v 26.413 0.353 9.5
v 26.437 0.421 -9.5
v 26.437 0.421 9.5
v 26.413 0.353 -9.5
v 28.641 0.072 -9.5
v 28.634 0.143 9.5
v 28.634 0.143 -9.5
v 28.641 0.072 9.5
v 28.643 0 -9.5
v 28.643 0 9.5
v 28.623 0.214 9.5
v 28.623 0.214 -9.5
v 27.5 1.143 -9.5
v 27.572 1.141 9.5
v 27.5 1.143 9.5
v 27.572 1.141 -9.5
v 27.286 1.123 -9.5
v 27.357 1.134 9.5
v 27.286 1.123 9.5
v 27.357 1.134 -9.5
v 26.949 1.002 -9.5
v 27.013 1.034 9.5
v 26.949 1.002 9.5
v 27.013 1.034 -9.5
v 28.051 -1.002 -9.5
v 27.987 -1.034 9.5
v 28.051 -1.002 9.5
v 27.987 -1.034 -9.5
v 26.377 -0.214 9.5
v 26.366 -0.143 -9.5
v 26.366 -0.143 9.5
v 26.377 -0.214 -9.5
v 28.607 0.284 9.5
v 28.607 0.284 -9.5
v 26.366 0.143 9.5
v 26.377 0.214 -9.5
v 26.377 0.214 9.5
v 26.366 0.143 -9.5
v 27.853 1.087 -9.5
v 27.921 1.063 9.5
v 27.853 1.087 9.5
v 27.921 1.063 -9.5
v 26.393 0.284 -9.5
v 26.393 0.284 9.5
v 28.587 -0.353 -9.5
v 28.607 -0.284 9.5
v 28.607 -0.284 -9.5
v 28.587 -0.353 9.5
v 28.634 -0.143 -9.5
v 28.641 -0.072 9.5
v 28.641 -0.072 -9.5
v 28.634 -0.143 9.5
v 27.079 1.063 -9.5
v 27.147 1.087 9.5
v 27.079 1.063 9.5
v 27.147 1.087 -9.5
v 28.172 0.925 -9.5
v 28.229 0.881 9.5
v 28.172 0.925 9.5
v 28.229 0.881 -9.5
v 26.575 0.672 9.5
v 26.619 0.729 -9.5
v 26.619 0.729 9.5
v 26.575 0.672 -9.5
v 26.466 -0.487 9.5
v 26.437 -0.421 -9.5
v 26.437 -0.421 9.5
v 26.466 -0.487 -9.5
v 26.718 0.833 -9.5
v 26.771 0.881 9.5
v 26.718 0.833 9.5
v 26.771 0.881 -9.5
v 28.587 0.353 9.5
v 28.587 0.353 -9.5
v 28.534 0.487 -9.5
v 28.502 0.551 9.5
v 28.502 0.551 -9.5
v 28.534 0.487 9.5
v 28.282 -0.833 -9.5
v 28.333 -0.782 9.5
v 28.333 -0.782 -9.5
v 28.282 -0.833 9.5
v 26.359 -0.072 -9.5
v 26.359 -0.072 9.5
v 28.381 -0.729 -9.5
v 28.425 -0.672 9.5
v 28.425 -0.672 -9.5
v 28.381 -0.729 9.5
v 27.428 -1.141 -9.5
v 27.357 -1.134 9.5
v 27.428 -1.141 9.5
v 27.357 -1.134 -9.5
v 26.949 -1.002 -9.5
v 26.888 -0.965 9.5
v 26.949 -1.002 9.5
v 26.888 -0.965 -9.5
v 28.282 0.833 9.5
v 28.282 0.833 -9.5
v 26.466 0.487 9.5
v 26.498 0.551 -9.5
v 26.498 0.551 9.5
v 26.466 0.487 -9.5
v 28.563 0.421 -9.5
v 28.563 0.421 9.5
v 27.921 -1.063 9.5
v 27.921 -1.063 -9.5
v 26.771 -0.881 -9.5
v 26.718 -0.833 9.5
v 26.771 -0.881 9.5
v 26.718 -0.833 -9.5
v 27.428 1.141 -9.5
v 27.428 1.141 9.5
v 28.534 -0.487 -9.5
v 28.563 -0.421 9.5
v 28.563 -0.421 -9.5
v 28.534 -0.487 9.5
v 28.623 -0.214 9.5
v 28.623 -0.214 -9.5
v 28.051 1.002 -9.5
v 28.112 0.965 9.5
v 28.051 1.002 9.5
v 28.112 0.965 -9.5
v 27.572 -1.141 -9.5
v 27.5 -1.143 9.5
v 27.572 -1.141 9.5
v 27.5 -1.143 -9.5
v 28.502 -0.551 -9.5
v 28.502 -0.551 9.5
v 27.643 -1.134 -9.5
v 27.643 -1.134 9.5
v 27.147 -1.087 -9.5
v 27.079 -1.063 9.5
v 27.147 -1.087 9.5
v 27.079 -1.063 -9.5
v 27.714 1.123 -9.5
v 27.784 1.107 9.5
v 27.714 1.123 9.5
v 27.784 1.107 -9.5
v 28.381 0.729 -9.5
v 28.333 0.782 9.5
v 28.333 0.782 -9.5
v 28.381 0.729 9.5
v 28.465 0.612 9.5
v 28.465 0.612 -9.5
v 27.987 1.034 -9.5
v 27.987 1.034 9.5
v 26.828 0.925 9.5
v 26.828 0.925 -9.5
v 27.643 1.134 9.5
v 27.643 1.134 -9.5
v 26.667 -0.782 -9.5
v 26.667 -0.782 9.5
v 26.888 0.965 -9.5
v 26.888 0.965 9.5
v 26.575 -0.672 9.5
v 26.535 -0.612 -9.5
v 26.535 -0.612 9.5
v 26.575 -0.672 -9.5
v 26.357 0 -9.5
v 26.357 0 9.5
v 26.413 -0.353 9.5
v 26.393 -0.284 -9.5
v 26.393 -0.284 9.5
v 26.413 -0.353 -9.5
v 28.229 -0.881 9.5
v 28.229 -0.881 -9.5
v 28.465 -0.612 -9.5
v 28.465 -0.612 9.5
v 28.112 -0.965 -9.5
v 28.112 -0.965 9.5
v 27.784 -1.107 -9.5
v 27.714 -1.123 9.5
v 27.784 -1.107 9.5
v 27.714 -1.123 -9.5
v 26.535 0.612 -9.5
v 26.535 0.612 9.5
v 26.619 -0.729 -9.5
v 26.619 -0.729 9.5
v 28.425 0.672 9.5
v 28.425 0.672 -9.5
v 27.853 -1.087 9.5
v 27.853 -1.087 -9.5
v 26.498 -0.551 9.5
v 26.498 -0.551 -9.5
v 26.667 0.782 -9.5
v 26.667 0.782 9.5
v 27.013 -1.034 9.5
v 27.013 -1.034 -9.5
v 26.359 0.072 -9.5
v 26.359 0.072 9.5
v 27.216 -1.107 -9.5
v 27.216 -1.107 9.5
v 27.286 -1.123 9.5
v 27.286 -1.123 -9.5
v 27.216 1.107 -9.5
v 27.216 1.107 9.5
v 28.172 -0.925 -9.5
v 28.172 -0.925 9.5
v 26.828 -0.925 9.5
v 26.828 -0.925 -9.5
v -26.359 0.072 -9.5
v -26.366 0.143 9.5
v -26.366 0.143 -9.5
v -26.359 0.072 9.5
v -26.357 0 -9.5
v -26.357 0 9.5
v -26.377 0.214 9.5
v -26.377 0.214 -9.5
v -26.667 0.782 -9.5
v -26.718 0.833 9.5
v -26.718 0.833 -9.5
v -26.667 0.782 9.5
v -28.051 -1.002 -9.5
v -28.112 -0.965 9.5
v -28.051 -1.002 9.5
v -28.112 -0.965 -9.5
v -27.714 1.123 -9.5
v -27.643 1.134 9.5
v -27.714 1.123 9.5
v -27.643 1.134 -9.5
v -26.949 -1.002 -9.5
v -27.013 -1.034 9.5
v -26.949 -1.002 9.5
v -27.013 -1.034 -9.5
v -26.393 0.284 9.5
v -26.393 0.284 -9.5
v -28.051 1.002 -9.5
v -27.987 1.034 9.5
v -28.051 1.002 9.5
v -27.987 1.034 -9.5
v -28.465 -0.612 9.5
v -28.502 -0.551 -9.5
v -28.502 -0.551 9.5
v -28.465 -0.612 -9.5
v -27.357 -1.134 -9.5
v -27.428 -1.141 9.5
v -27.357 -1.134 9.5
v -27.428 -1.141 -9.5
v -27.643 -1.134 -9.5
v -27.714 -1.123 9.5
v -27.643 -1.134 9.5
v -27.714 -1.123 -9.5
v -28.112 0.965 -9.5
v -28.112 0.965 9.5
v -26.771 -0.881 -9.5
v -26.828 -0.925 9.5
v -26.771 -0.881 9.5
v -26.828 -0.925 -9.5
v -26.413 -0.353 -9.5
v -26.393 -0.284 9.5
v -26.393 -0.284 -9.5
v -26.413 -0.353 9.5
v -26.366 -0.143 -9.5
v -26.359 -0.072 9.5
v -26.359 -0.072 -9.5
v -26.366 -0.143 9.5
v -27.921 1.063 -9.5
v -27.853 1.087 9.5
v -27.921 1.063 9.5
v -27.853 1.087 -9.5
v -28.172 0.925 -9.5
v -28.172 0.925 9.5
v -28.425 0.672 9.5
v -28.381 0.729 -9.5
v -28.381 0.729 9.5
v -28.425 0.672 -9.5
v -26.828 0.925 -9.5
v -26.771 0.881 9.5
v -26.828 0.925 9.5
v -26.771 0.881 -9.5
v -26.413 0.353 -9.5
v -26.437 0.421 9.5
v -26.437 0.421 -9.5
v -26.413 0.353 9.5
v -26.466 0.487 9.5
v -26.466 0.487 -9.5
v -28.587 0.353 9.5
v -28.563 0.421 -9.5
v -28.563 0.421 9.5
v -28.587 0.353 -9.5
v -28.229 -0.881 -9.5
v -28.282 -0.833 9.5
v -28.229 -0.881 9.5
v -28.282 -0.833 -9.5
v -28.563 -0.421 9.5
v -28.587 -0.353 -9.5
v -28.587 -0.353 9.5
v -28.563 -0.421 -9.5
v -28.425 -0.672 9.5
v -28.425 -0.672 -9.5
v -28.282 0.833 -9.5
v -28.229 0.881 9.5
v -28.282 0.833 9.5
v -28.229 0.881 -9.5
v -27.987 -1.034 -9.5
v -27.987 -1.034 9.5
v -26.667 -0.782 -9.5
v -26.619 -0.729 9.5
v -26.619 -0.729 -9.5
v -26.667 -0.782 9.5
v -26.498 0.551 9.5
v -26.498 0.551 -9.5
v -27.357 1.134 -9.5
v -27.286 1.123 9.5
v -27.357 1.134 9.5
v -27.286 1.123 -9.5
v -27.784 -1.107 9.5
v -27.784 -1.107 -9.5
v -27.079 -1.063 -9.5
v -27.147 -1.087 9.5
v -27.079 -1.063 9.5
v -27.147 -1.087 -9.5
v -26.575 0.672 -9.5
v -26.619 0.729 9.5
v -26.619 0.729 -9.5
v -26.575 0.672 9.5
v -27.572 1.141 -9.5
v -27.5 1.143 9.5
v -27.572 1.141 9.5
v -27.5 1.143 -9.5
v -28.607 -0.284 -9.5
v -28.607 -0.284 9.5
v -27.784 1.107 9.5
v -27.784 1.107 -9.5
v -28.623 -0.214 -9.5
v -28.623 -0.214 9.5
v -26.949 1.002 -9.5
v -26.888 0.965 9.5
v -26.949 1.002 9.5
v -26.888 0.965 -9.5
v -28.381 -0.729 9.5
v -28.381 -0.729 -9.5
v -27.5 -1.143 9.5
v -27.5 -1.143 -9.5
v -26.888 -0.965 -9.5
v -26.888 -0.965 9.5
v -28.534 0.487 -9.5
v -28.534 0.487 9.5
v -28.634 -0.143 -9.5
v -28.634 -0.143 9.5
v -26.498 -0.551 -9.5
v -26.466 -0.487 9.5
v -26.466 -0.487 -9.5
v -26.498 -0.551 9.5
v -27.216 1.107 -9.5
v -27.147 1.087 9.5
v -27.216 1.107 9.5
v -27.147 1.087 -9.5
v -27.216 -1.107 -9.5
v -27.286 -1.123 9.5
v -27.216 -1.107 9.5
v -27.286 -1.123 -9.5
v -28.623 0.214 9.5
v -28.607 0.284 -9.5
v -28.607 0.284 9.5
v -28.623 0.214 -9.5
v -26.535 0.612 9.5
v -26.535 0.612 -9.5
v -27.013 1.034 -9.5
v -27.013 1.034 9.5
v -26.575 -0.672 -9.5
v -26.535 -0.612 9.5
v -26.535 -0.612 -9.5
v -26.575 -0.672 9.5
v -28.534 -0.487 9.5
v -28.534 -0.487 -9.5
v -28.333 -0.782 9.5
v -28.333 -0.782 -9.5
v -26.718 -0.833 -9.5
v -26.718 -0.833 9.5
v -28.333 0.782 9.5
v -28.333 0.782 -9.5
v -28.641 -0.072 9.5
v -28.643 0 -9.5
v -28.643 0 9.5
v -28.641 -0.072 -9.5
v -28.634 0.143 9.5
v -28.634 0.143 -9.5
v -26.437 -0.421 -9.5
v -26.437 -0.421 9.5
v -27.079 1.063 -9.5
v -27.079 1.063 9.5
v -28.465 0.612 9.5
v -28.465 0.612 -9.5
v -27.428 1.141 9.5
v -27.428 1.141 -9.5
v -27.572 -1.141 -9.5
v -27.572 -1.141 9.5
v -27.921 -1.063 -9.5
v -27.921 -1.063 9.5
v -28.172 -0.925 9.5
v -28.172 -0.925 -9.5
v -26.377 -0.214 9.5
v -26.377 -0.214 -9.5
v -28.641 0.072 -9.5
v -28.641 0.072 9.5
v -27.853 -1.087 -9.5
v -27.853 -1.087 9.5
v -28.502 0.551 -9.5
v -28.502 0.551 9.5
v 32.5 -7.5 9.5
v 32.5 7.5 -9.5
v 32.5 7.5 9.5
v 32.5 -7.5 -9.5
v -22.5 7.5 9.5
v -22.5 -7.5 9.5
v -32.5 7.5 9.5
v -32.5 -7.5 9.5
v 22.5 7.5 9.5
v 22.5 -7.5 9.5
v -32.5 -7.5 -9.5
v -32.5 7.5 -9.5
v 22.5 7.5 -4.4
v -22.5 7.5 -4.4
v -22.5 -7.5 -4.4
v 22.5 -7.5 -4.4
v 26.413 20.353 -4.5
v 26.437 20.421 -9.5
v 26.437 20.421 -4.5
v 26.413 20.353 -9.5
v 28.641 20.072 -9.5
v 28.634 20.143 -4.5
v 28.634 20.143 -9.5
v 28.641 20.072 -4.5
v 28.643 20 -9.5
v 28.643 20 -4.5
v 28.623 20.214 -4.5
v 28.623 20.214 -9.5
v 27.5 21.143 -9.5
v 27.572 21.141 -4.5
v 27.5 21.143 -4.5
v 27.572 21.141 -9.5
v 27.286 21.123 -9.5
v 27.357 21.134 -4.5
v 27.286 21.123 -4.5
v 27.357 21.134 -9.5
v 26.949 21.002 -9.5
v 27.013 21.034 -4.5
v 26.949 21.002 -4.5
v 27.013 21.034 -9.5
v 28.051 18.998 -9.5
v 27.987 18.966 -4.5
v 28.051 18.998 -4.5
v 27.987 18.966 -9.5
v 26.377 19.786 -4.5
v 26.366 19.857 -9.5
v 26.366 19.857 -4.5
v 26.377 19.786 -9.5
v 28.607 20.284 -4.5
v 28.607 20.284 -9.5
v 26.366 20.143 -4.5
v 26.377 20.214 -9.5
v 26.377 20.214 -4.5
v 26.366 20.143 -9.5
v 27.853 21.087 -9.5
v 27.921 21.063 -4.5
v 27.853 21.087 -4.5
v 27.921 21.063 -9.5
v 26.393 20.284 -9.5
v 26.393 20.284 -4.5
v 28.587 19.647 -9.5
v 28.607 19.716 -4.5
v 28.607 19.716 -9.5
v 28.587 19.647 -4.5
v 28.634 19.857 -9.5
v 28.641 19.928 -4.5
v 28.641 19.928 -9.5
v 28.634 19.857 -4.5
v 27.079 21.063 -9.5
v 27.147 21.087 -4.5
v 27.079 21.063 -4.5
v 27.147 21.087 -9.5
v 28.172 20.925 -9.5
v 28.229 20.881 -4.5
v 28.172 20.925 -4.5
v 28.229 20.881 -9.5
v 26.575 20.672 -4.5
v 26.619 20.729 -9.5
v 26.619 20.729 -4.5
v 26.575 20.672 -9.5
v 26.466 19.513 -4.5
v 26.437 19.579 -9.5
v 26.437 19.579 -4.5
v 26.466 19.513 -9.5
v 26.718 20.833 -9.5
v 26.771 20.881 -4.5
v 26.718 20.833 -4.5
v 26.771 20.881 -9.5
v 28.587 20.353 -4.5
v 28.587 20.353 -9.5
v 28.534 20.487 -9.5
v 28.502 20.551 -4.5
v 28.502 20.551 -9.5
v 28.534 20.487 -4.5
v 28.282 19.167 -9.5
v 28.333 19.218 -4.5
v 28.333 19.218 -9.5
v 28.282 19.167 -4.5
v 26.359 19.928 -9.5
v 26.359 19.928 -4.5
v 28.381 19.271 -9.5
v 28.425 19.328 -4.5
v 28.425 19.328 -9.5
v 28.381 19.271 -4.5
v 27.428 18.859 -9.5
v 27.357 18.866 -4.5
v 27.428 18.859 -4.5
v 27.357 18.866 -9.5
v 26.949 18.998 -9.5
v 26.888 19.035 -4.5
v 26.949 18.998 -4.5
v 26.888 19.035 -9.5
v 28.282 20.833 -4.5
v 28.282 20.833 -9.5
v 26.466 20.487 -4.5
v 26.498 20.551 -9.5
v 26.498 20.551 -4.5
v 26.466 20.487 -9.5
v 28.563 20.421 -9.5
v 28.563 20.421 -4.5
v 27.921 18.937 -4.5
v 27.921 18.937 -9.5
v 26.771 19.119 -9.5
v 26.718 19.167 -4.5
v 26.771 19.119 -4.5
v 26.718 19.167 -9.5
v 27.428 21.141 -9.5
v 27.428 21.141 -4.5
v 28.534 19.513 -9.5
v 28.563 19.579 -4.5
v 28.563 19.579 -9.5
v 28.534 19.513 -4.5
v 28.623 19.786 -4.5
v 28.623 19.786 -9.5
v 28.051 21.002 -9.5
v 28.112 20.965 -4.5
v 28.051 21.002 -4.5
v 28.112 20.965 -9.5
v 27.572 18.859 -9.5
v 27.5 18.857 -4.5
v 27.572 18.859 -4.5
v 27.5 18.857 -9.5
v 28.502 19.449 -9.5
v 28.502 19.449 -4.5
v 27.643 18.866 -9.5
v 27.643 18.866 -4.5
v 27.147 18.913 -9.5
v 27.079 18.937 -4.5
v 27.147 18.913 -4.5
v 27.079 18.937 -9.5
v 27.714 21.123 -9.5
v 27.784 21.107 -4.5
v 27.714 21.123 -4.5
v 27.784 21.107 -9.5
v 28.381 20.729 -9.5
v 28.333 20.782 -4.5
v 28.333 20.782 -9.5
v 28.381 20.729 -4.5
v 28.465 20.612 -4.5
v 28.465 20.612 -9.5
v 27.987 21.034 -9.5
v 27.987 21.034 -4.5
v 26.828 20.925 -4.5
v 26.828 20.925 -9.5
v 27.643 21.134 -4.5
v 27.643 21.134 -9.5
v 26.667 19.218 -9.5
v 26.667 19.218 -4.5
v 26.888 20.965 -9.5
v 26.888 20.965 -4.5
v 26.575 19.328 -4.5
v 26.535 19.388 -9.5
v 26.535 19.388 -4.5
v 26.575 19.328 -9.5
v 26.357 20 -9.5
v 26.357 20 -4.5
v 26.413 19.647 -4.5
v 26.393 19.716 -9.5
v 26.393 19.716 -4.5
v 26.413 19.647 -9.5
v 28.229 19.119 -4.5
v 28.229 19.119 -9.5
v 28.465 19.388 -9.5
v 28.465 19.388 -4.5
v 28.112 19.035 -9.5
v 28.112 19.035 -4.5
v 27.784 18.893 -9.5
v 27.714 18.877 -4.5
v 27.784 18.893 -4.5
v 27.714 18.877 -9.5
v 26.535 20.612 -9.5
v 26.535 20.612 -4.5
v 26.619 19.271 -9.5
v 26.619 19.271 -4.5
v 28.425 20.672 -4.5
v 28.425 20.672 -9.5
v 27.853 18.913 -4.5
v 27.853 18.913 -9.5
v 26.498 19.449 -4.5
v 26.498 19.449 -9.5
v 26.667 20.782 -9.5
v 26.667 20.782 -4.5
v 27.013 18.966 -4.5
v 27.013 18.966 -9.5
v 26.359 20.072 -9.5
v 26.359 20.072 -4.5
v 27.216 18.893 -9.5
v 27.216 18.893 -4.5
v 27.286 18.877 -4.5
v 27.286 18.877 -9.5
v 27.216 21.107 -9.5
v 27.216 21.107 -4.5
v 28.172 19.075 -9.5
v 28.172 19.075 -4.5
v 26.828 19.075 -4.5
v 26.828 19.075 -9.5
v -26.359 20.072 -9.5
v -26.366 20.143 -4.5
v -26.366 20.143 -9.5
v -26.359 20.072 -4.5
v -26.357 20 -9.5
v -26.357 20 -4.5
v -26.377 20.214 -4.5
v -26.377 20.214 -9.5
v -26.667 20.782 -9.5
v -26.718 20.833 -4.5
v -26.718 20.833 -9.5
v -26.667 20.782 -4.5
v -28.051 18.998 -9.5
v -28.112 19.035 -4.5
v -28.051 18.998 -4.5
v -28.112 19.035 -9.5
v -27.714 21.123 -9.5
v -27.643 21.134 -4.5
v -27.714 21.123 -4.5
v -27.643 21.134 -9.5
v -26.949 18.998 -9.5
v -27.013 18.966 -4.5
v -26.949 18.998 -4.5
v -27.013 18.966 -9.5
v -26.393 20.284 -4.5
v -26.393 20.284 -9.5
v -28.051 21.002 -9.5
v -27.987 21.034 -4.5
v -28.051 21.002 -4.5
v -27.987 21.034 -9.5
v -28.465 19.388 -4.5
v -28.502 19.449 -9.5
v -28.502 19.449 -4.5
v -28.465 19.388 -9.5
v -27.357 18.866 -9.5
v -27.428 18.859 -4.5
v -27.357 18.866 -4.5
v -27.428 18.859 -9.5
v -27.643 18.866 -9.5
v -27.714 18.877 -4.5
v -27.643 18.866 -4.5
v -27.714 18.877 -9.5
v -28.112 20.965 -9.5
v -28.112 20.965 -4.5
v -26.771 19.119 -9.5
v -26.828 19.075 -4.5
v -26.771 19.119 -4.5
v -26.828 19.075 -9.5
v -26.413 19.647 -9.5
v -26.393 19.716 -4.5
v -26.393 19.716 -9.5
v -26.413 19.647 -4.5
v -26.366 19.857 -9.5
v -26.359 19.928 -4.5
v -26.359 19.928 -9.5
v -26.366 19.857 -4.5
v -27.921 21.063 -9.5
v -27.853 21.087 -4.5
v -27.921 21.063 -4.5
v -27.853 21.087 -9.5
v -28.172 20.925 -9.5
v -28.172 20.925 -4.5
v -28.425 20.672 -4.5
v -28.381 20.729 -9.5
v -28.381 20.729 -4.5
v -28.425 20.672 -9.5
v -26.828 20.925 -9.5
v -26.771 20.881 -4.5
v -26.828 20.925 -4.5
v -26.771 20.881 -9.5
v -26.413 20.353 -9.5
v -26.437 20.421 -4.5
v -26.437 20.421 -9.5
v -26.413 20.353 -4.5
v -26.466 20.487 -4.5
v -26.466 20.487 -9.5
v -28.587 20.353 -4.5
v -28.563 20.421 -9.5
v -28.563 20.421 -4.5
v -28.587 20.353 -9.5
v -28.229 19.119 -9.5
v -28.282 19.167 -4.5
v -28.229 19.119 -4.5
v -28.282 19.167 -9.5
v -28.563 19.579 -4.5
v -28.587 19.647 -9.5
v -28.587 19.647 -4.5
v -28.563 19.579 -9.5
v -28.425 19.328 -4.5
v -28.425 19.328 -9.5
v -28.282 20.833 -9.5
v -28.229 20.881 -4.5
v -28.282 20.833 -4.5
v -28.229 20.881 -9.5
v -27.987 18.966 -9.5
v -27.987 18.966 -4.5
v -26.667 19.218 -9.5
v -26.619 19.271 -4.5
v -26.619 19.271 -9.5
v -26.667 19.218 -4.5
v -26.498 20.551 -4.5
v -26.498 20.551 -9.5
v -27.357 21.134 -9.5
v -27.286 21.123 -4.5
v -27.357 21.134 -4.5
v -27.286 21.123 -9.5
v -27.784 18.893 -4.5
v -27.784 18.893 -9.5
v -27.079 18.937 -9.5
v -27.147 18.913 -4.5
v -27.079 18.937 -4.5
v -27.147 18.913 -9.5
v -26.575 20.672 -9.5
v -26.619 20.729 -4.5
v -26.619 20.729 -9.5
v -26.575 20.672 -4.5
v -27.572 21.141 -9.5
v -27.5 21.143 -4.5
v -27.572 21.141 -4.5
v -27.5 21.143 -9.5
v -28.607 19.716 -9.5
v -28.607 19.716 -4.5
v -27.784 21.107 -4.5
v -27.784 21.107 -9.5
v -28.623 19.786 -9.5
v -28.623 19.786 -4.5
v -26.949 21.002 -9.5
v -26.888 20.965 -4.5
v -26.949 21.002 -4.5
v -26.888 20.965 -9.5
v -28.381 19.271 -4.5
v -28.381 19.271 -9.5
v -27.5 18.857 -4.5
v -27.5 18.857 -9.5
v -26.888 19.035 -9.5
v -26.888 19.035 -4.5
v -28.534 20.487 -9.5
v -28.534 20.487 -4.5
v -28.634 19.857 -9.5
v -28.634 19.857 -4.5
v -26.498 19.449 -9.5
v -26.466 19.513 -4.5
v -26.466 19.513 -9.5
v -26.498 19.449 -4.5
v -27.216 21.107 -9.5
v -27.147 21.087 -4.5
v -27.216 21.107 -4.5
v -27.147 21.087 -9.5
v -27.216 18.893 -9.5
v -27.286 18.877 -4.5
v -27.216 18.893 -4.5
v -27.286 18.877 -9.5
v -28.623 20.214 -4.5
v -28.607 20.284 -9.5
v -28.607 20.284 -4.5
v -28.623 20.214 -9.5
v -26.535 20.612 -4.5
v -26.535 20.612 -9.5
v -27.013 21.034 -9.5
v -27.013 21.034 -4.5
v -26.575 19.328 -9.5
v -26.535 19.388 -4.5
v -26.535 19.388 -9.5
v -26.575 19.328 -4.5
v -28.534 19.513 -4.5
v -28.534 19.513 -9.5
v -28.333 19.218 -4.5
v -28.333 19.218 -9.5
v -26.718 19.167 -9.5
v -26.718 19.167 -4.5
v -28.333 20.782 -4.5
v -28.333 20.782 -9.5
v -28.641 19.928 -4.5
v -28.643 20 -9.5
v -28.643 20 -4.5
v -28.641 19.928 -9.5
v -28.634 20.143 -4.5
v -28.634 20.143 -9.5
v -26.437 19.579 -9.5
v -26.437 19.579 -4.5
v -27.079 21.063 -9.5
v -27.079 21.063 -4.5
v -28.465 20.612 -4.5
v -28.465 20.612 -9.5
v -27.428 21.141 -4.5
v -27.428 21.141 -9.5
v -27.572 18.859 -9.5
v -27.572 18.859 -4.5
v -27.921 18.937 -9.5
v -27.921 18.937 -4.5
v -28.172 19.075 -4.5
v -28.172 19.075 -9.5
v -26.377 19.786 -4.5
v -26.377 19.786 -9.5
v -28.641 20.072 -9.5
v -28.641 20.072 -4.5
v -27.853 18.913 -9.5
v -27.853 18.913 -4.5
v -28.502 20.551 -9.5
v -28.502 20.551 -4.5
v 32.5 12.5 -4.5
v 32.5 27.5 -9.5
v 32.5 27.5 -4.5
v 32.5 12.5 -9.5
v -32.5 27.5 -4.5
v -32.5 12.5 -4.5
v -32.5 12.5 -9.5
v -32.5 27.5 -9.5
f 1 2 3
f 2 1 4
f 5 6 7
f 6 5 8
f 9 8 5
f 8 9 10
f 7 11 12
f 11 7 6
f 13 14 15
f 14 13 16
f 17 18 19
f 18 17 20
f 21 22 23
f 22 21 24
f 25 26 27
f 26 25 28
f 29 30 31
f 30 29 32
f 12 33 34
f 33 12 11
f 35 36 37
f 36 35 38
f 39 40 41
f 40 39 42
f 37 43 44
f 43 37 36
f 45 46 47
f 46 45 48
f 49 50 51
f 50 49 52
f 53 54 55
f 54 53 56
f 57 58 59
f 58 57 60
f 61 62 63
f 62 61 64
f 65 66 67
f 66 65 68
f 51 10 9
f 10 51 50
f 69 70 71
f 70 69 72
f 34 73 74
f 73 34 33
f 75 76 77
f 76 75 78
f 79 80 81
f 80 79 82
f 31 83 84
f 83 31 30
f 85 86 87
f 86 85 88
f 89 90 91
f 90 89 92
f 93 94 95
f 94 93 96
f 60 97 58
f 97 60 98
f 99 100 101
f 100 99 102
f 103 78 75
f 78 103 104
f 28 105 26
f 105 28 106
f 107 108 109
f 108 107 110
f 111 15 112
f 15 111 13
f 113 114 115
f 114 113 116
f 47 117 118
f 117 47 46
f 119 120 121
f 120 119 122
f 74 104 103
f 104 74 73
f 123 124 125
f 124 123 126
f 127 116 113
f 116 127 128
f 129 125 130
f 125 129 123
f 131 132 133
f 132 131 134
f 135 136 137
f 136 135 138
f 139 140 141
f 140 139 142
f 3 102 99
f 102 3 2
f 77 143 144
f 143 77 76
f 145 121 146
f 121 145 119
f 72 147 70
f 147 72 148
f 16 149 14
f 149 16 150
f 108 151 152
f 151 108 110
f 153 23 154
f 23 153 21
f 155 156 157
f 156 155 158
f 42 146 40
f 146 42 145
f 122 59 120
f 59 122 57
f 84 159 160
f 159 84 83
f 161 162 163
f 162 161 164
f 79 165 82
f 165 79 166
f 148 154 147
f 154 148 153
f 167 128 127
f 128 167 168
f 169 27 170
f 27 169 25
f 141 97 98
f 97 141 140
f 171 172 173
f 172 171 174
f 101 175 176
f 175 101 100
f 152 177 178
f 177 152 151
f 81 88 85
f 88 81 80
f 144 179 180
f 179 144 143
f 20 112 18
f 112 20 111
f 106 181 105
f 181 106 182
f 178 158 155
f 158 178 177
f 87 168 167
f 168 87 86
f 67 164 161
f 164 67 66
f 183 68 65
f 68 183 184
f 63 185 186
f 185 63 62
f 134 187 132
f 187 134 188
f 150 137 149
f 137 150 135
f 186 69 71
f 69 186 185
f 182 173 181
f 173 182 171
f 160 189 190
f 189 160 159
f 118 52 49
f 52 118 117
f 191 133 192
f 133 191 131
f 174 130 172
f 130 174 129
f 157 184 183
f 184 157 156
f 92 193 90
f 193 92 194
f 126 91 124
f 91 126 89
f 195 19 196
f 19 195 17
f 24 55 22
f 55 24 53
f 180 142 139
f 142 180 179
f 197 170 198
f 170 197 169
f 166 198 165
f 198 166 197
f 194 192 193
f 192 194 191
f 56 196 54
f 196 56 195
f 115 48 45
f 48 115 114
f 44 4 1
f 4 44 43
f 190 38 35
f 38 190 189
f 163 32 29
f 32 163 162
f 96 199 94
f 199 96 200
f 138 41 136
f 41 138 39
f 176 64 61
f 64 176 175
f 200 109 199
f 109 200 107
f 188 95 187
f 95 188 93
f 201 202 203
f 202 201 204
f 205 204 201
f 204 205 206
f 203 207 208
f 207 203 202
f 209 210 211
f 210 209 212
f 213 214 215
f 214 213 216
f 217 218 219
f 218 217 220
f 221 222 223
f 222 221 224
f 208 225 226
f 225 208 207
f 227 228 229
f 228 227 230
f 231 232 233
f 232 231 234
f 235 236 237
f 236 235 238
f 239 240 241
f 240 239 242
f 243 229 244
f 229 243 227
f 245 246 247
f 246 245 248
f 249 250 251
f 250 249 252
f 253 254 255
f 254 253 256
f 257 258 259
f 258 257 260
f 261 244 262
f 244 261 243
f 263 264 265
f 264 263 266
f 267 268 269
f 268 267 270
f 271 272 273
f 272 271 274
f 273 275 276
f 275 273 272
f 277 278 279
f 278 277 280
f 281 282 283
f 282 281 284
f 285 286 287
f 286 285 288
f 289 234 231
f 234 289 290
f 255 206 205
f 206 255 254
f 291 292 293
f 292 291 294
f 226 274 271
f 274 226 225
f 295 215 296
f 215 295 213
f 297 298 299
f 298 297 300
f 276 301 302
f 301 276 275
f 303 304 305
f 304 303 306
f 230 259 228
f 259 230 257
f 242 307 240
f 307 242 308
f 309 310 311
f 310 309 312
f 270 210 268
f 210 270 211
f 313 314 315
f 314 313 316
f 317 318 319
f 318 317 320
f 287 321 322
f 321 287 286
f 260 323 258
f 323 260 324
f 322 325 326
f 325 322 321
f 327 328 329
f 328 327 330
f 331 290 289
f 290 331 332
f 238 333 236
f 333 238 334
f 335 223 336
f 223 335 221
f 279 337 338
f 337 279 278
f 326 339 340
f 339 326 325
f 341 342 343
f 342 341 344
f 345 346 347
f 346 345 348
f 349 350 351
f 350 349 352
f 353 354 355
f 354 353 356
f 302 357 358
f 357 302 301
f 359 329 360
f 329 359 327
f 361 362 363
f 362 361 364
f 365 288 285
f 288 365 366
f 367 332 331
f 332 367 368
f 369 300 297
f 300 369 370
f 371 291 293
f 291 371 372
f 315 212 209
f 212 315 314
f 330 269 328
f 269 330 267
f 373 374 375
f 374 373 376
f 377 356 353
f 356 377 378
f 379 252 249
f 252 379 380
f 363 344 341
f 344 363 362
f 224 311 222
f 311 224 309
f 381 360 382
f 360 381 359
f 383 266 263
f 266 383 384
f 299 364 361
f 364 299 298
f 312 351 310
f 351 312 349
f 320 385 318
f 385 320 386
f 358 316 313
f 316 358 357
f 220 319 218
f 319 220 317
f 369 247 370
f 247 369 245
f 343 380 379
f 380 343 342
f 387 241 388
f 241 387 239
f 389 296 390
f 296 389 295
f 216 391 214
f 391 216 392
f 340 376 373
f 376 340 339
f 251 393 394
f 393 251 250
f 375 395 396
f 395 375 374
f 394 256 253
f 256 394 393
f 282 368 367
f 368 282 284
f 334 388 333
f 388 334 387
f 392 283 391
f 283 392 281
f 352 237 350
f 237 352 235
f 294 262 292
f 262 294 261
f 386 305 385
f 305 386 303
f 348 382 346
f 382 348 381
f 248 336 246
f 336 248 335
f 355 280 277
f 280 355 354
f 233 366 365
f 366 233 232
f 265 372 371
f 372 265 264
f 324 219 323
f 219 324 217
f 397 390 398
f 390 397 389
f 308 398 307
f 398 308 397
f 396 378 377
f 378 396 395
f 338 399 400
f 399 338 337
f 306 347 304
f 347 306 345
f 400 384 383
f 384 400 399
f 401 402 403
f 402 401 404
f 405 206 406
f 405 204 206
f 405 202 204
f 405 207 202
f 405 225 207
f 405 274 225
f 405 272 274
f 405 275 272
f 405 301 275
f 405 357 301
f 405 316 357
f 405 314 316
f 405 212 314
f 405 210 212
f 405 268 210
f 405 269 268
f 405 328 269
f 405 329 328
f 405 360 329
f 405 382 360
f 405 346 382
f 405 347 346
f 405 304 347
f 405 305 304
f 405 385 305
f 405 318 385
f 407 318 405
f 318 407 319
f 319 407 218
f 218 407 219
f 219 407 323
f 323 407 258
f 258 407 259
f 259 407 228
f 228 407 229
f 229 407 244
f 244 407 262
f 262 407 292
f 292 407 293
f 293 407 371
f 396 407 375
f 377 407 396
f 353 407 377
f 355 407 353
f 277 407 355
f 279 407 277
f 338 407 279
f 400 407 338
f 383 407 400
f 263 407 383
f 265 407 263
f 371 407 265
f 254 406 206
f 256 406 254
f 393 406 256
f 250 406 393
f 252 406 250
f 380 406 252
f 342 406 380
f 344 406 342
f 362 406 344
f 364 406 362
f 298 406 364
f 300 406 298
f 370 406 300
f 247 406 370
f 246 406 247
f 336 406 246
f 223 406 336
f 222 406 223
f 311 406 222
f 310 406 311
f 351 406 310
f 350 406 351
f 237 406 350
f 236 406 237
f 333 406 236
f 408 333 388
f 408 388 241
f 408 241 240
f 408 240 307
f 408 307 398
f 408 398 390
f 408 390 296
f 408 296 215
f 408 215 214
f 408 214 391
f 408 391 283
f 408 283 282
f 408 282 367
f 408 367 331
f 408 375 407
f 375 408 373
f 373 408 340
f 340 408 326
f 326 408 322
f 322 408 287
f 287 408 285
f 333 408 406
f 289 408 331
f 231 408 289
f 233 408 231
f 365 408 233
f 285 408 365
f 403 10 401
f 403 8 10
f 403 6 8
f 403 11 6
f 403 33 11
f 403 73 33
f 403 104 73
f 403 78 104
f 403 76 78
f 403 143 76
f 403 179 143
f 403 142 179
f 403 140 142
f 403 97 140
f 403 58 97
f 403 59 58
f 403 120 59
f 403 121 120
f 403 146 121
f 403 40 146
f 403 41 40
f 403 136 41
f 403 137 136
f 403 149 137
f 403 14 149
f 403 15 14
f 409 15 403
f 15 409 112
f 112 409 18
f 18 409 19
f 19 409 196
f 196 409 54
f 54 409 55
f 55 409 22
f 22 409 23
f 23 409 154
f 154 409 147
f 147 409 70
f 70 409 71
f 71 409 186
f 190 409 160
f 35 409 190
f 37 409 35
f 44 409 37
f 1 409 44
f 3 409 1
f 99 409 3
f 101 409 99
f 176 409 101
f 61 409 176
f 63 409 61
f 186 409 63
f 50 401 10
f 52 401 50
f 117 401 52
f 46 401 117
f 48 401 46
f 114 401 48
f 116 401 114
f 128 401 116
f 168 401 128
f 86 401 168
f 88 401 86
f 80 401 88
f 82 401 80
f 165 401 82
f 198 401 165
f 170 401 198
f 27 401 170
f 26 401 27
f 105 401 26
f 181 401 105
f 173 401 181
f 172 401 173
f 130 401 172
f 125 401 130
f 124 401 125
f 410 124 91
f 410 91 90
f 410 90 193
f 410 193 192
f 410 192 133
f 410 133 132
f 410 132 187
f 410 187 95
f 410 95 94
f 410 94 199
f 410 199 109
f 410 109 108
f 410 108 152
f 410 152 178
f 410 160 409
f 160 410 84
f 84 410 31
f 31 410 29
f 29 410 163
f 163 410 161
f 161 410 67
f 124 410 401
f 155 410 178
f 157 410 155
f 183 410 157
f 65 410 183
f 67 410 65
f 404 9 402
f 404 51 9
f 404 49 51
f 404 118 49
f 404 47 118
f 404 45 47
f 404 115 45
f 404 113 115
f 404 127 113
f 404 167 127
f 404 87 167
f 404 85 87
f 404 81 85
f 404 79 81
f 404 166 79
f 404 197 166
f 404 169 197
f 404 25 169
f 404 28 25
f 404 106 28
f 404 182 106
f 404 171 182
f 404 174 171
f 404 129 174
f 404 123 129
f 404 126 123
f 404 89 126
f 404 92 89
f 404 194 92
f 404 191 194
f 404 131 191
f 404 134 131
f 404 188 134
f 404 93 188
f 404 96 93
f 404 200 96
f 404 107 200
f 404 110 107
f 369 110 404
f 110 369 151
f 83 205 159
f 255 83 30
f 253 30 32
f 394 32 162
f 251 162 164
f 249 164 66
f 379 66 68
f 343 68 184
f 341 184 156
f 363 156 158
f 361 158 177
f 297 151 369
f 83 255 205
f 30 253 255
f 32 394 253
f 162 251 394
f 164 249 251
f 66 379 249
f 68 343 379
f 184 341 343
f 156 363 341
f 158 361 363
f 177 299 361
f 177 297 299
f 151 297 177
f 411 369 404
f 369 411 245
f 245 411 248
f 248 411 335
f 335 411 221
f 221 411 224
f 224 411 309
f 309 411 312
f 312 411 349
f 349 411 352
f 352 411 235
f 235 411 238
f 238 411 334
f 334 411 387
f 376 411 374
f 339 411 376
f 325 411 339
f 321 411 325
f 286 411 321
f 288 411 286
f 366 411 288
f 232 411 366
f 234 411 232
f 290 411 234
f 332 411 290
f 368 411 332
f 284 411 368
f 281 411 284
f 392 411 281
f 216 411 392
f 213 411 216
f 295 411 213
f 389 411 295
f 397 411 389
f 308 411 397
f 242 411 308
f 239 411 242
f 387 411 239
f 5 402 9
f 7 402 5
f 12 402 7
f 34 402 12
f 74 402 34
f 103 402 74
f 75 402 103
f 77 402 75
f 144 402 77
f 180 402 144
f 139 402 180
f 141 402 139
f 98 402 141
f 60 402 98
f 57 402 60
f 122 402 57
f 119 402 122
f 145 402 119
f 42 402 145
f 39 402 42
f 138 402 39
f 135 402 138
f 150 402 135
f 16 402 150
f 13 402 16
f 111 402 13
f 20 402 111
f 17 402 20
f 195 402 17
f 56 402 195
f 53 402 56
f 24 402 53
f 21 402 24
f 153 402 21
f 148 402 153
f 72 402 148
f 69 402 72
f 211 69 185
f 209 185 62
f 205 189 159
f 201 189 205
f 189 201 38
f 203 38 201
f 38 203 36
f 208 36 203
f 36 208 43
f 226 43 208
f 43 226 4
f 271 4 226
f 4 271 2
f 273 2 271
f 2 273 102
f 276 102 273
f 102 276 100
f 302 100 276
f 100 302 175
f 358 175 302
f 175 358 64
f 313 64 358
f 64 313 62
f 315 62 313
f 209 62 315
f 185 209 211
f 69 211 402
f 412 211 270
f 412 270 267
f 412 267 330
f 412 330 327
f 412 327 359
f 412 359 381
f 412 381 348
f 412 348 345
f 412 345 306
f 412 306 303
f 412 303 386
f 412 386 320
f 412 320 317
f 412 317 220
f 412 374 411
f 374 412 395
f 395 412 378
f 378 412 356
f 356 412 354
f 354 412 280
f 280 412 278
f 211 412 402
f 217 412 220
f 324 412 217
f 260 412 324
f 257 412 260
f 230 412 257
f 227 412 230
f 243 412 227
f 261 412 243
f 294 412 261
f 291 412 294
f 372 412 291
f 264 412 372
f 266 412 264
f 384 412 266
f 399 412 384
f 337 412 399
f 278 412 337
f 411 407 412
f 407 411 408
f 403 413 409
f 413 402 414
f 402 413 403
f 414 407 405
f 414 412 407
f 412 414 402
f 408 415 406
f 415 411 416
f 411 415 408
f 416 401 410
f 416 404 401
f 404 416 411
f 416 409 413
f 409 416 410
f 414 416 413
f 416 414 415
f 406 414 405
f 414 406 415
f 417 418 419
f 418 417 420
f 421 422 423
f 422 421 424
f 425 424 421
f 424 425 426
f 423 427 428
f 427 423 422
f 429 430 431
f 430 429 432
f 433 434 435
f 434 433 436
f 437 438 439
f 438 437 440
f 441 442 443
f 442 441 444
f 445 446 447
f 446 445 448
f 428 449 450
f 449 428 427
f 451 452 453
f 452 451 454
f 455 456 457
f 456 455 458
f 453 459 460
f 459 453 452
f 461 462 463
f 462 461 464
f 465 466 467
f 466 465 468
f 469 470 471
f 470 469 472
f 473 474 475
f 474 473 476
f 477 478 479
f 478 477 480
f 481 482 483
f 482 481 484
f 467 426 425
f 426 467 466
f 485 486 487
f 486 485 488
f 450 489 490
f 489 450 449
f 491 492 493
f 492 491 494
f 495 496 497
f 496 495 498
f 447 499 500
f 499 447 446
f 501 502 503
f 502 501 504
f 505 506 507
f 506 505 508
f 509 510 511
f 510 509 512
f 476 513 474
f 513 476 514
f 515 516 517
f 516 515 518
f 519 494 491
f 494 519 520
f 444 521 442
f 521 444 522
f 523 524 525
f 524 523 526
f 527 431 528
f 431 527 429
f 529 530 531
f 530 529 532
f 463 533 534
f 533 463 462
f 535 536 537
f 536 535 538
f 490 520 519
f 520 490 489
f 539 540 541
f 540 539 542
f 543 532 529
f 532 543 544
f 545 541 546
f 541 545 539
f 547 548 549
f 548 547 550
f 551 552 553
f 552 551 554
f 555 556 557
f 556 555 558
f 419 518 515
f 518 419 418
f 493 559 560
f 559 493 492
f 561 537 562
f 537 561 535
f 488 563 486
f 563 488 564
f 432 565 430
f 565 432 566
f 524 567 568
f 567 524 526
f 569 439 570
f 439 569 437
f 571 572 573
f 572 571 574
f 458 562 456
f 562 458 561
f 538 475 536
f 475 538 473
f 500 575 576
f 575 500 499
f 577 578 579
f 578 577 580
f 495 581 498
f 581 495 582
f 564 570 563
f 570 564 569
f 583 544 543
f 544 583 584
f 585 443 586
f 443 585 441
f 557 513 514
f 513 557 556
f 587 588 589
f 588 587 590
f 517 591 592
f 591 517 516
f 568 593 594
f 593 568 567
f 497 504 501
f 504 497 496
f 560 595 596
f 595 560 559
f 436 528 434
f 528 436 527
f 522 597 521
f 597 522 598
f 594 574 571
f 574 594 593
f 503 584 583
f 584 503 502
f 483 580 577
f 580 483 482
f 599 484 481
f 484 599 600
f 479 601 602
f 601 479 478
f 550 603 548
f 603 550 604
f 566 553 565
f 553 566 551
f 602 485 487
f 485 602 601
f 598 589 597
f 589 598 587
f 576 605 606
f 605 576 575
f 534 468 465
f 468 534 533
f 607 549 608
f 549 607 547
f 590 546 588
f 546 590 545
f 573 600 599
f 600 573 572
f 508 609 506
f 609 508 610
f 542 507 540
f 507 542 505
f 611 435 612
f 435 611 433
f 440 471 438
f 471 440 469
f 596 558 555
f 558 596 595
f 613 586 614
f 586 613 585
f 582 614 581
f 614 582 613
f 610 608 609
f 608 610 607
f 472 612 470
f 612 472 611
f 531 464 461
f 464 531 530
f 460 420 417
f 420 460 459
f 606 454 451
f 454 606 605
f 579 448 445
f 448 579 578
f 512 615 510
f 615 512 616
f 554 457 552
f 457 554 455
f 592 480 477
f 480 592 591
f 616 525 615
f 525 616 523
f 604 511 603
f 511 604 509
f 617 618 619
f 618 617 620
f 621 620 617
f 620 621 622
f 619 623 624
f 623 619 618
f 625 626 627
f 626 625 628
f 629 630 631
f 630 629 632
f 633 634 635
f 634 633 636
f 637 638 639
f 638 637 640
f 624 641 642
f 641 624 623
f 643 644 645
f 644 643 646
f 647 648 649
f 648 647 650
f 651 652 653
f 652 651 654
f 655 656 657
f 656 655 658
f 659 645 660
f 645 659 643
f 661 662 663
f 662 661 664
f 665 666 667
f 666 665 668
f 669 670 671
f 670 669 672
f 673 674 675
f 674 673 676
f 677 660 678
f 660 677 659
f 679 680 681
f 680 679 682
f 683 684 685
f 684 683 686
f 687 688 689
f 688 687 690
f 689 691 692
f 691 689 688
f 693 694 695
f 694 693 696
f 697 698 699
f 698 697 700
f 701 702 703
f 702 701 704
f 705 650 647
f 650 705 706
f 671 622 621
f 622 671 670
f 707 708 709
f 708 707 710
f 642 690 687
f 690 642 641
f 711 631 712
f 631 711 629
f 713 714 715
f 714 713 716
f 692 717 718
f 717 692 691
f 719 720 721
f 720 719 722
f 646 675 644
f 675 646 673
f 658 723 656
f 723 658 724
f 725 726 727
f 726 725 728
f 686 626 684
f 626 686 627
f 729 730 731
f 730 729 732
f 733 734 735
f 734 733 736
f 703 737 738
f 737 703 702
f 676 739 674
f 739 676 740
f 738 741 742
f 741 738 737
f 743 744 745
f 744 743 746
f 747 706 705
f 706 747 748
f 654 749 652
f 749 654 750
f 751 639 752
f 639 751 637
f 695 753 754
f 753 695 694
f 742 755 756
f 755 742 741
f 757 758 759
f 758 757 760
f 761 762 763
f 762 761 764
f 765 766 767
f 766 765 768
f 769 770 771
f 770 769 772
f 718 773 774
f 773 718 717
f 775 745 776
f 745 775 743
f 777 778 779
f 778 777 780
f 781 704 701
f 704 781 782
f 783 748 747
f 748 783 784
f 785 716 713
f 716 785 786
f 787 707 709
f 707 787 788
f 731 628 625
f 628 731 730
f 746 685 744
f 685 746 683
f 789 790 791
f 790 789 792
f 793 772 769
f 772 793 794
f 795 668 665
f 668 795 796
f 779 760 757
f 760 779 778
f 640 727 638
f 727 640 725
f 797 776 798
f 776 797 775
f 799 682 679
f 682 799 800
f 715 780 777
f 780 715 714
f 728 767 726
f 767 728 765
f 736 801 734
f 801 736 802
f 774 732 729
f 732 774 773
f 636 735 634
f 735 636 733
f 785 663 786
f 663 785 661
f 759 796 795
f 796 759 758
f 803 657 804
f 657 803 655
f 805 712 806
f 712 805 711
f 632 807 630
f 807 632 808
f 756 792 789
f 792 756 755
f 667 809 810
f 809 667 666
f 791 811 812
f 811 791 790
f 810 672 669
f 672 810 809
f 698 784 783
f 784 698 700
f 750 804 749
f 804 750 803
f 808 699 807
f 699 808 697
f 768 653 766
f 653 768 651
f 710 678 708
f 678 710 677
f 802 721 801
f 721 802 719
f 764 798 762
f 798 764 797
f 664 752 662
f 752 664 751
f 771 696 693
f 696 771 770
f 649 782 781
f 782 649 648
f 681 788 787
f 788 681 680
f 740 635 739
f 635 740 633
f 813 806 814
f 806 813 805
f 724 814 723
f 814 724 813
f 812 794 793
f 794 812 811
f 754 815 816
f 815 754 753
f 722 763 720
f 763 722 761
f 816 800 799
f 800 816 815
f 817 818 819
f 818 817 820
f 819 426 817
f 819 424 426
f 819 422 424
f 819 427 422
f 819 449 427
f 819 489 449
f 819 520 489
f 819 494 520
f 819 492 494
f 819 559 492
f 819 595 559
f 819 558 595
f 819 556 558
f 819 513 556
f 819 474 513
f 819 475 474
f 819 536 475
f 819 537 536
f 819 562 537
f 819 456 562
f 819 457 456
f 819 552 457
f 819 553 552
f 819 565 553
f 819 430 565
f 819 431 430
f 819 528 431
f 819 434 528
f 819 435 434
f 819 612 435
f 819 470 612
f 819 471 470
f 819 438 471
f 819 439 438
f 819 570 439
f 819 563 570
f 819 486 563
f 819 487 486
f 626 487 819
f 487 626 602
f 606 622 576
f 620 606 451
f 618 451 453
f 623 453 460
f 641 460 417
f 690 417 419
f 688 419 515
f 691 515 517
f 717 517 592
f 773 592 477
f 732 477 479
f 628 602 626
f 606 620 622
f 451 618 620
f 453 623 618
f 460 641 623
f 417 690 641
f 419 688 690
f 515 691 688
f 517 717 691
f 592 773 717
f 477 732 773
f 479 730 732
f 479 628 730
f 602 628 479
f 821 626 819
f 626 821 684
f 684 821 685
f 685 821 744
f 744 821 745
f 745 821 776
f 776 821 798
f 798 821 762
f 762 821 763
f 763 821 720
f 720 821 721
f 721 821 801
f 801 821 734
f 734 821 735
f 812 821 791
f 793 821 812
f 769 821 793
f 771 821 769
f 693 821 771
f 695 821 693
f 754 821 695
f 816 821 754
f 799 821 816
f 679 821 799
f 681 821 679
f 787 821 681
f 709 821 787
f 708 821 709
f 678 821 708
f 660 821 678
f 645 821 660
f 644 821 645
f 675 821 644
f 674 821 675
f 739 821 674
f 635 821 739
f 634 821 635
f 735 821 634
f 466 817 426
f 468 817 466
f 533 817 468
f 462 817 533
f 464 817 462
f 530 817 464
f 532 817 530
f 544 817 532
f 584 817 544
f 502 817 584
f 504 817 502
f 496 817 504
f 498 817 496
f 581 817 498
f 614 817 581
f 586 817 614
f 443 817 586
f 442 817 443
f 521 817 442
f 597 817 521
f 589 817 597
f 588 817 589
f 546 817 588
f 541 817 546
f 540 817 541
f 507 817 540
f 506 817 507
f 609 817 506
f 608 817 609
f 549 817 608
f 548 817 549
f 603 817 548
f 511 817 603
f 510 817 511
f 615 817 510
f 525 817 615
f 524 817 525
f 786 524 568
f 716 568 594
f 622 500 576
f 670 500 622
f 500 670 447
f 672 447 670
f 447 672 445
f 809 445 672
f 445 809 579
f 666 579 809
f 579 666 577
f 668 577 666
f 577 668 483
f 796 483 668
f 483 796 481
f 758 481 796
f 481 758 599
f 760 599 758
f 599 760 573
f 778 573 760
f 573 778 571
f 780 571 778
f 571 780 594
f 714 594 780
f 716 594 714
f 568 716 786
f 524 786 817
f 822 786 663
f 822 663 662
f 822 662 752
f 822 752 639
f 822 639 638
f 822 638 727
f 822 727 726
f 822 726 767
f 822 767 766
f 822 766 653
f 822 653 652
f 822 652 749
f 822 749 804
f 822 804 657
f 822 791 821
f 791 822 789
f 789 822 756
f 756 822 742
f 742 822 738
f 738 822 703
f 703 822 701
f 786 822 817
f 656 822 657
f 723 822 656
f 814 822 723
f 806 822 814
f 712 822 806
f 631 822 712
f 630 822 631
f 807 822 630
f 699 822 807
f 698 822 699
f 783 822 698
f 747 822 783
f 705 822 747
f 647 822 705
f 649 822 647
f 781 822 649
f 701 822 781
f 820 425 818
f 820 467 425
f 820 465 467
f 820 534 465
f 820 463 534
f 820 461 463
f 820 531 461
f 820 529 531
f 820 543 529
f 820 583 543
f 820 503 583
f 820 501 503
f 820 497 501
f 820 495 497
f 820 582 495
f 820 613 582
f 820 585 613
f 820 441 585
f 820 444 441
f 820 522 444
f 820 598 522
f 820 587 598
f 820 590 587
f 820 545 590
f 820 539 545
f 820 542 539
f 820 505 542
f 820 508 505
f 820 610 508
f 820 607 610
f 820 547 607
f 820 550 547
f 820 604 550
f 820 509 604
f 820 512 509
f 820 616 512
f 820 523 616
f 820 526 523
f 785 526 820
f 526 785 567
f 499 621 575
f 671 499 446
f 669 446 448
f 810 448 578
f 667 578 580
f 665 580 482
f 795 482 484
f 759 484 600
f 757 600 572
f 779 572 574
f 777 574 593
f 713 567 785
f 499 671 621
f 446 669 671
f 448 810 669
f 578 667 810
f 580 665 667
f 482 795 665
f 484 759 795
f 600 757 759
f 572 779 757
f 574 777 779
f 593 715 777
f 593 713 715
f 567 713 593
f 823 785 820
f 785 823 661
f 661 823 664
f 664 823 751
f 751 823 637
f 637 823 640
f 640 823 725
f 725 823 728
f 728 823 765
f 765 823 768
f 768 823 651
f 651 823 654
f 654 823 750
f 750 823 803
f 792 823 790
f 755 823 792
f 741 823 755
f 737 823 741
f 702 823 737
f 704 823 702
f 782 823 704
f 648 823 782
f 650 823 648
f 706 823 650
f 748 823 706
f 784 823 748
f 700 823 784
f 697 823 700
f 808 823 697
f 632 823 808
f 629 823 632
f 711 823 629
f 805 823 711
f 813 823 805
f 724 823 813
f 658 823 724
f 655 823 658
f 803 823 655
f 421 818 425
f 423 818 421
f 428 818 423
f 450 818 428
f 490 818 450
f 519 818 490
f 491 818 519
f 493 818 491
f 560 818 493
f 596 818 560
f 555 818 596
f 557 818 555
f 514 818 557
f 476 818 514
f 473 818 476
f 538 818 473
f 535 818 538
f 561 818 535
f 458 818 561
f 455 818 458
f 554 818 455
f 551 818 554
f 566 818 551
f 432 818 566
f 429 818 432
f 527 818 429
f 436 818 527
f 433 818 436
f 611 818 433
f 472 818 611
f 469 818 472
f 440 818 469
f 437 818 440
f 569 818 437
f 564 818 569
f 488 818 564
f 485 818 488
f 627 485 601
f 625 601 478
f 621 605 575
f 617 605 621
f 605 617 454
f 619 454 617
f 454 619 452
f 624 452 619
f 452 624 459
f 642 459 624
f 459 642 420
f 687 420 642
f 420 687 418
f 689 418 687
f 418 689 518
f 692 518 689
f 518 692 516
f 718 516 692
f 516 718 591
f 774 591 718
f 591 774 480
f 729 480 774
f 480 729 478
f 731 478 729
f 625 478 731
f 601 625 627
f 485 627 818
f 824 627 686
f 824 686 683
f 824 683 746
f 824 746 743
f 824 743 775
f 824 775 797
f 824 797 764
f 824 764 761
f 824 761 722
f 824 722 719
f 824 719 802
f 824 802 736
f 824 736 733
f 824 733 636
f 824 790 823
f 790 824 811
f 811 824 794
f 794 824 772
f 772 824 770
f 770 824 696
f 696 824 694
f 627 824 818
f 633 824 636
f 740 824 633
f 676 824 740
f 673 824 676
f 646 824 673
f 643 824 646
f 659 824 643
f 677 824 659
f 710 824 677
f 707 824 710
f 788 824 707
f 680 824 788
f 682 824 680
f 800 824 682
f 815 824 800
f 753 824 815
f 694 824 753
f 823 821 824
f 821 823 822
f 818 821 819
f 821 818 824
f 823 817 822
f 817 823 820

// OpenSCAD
width = 45;
height = 14;
girth = 15;
beef = 10;
module projector(width,height,girth)
{
  cube([width,girth + 5,height],center=true);
}
module screw_tube()
{
  cylinder(r = 2.286/2, h = 20, center = true, $fn=100);  
}
module screw_holes(width,beef)
{
    translate([width/2 + beef/2,0,0])
    screw_tube();
    translate([-width/2 - beef/2,0,0])
    screw_tube();
}
module base_block(width,height,girth,beef)
{
  difference()
  {
  
    cube([width+2*beef,girth,height+beef/2],center=true);
    translate([0,0,beef*0.26])
    projector(width,height,girth);
    screw_holes(width,beef);
  }
}

module top_block(width,height,girth,beef)
{
  difference()
  {
    cube([width+2*beef,girth,beef/2],center=true);
    translate([0,0,beef*0.26])
    screw_holes(width,beef);
  }
}

base_block(width,height,girth,beef);
translate([0,girth+5,-height/2])
top_block(width,height,girth,beef);
